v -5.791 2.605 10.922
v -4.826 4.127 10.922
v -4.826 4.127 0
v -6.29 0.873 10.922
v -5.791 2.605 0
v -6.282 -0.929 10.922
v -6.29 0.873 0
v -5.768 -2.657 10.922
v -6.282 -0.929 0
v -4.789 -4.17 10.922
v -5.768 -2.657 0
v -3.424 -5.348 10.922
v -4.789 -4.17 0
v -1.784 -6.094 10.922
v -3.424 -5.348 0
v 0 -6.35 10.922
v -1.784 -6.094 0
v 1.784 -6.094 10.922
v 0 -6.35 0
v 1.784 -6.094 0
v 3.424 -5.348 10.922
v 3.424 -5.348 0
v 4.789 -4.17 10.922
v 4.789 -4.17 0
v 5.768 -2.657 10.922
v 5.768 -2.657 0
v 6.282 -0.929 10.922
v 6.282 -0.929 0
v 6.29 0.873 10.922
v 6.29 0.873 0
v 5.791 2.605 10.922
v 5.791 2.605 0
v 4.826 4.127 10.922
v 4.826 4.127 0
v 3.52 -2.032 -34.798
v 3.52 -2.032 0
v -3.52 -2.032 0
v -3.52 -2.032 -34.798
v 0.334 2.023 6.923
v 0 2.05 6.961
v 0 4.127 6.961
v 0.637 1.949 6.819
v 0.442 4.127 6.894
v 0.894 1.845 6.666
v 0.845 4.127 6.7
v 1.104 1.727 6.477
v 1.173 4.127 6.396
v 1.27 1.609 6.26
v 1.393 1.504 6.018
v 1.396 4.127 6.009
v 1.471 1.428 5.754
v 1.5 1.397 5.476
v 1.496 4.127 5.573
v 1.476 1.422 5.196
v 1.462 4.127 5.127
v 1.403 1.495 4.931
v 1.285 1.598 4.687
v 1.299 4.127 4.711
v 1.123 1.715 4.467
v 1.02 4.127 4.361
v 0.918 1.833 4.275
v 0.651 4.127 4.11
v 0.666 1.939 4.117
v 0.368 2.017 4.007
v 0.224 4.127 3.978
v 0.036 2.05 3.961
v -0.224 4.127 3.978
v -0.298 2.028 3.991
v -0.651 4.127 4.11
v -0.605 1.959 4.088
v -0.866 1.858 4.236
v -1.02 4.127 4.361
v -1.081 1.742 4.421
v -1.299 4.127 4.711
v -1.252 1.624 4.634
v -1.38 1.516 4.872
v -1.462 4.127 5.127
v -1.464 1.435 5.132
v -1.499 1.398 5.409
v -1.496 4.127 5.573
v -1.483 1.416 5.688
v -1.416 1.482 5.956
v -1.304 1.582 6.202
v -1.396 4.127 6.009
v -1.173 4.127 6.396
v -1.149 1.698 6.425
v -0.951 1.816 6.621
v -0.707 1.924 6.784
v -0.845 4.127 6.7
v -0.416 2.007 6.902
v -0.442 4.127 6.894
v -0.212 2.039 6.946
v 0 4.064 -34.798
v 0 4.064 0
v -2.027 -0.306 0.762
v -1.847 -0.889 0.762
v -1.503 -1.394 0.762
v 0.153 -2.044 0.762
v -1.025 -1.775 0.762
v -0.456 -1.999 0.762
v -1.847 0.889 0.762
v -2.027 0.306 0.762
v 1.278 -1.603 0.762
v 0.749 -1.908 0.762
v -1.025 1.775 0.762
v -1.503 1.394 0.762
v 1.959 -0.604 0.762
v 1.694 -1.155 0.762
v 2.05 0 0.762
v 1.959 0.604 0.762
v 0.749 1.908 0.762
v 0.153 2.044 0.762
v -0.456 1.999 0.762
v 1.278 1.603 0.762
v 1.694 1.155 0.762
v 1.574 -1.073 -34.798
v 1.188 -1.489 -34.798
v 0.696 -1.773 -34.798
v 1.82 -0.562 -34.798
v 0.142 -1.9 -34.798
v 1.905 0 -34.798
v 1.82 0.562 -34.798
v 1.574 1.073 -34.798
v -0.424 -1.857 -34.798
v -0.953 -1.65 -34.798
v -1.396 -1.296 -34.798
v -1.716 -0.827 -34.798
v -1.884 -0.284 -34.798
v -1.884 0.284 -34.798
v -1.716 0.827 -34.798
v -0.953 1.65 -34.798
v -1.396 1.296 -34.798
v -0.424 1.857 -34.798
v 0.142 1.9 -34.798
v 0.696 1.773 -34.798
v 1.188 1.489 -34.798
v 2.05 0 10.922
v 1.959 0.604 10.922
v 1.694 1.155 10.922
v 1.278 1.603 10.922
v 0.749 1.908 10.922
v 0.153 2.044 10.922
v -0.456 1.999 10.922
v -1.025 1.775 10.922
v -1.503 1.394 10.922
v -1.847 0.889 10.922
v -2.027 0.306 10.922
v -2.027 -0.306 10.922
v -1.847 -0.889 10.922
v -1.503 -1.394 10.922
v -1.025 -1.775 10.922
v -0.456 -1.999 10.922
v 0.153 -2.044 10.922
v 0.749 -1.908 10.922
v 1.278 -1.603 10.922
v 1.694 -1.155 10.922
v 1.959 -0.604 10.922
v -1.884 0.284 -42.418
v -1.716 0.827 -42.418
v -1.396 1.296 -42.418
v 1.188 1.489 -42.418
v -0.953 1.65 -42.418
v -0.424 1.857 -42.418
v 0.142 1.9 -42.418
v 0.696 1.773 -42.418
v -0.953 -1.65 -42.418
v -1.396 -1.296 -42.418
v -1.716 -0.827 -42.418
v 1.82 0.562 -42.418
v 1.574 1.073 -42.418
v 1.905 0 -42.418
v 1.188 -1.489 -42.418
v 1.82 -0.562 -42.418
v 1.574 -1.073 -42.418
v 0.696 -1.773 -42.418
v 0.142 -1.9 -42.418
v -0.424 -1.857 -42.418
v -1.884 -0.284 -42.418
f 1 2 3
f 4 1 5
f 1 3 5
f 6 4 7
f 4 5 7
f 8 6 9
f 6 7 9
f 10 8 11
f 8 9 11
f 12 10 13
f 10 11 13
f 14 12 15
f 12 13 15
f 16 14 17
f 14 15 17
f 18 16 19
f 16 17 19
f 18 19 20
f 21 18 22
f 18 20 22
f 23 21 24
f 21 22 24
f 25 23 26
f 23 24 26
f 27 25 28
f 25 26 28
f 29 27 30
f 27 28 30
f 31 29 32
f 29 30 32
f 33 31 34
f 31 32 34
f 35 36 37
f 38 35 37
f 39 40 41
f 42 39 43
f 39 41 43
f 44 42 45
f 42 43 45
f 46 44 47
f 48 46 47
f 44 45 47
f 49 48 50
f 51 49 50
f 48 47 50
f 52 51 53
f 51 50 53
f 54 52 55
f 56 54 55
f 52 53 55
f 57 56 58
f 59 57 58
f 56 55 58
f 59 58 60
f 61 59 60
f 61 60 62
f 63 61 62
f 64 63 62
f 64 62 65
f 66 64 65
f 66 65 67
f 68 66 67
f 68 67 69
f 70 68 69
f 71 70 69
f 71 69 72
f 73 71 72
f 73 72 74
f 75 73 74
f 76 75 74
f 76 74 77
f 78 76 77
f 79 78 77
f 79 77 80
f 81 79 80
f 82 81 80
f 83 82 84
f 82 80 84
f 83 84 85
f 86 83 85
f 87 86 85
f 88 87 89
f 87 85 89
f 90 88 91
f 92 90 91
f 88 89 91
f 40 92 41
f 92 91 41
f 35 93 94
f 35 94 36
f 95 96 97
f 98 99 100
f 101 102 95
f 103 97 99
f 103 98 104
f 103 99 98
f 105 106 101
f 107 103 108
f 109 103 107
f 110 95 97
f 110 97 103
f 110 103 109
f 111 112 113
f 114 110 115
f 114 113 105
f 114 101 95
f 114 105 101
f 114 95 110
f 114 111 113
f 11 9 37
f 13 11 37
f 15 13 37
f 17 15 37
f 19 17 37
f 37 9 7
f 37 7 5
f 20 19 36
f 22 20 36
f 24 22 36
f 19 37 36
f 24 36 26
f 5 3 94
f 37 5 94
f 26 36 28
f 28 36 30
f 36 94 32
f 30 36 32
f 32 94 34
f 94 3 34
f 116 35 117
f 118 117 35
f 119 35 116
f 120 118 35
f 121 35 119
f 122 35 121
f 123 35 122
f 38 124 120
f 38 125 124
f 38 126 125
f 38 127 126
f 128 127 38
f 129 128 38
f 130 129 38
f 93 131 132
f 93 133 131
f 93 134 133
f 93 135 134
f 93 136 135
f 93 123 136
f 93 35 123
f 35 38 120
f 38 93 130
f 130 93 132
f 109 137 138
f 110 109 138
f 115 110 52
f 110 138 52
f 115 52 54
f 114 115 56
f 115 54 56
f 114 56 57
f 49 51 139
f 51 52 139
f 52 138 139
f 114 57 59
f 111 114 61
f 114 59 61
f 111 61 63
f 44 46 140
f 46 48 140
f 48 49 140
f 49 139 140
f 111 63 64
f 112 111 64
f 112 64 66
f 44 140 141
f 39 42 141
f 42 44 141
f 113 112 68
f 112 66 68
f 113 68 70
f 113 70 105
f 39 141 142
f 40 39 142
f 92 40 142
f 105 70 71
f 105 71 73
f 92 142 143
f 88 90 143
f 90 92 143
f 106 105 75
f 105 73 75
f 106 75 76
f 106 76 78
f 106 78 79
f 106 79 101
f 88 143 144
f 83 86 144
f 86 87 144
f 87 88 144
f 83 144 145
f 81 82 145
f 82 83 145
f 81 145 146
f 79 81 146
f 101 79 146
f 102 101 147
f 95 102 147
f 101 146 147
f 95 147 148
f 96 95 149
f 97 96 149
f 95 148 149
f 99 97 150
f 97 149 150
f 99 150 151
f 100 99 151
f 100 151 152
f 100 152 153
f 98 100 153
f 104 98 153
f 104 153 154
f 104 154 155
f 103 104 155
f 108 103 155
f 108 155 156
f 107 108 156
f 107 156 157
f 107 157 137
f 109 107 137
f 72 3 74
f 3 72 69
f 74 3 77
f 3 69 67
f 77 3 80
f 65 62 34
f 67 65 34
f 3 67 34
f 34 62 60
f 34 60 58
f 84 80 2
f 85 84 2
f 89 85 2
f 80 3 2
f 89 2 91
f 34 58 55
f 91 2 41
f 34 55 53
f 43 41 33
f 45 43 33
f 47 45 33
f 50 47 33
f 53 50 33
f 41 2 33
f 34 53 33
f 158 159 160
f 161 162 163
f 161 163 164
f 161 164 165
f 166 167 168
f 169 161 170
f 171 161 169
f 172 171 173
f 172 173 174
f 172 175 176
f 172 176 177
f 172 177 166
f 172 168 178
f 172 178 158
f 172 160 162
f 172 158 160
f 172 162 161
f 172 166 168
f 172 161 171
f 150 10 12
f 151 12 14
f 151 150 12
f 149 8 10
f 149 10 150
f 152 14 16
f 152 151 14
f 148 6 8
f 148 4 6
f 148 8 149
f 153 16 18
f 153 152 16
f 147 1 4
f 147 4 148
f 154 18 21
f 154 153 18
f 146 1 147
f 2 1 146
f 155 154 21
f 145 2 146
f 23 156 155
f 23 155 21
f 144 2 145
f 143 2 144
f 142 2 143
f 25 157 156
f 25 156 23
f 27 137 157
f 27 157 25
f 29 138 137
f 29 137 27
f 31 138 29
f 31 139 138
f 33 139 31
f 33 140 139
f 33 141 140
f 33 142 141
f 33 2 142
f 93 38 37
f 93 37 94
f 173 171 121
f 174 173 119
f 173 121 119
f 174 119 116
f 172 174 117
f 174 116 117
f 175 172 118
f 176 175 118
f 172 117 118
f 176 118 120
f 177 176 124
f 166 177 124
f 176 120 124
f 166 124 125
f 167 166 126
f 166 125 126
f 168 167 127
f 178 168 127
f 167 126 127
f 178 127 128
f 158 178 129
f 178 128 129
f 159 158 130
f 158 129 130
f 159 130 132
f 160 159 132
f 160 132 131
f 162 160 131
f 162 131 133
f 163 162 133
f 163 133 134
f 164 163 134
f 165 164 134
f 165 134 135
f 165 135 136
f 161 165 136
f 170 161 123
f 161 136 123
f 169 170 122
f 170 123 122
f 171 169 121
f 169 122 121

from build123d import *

# Parameters (mm, degrees)
SKETCH2_R           = 6.35
BOSS_EXTRUDE1_DEPTH = 10.922
SKETCH3_W           = 11.565028963
SKETCH3_H           = 5.944743938
CUT_EXTRUDE1_DEPTH  = 15.24
SKETCH4_R           = 1.5
CUT_EXTRUDE2_DEPTH  = 5.08
SKETCH6_R           = 2.05
CUT_EXTRUDE3_DEPTH  = 10.16
BOSS_EXTRUDE2_DEPTH = 34.798
SKETCH9_R           = 1.905
BOSS_EXTRUDE3_DEPTH = 7.62


with BuildPart() as part:
    # Sketch2 → Boss-Extrude1 (new body)
    with BuildSketch(Plane.XY):
        Circle(SKETCH2_R)
    extrude(amount=BOSS_EXTRUDE1_DEPTH)

    # Sketch3 → Cut-Extrude1 (cut)
    with BuildSketch(Plane.XY.offset(10.922)):
        with Locations((0.956423272, 7.099276819)):
            Rectangle(SKETCH3_W, SKETCH3_H)
    extrude(amount=-CUT_EXTRUDE1_DEPTH, mode=Mode.SUBTRACT)

    # Sketch4 → Cut-Extrude2 (cut)
    with BuildSketch(Plane(origin=(0, 4.12690485, 0), x_dir=(1, 0, 0), z_dir=(0, 1, 0))):
        with Locations(Location((0, -5.461, 0), (0, 0, 270))):
            Circle(SKETCH4_R)
    extrude(amount=-CUT_EXTRUDE2_DEPTH, mode=Mode.SUBTRACT)

    # Sketch6 → Cut-Extrude3 (cut)
    with BuildSketch(Plane.XY.offset(10.922)):
        Circle(SKETCH6_R)
    extrude(amount=-CUT_EXTRUDE3_DEPTH, mode=Mode.SUBTRACT)

    # Sketch8 → Boss-Extrude2 (add)
    with BuildSketch(Plane(origin=(0, 0, 0), x_dir=(-1, 0, 0), z_dir=(0, 0, -1))):
        Polygon((0, 4.064), (-3.519527241, -2.032), (3.519527241, -2.032), align=None)
    extrude(amount=BOSS_EXTRUDE2_DEPTH)

    # Sketch9 → Boss-Extrude3 (add)
    with BuildSketch(Plane(origin=(0, 0, -34.798), x_dir=(-1, 0, 0), z_dir=(0, 0, -1))):
        with Locations(Location((0, 0, 0), (0, 0, 180))):
            Circle(SKETCH9_R)
    extrude(amount=BOSS_EXTRUDE3_DEPTH)


solid = part.part
